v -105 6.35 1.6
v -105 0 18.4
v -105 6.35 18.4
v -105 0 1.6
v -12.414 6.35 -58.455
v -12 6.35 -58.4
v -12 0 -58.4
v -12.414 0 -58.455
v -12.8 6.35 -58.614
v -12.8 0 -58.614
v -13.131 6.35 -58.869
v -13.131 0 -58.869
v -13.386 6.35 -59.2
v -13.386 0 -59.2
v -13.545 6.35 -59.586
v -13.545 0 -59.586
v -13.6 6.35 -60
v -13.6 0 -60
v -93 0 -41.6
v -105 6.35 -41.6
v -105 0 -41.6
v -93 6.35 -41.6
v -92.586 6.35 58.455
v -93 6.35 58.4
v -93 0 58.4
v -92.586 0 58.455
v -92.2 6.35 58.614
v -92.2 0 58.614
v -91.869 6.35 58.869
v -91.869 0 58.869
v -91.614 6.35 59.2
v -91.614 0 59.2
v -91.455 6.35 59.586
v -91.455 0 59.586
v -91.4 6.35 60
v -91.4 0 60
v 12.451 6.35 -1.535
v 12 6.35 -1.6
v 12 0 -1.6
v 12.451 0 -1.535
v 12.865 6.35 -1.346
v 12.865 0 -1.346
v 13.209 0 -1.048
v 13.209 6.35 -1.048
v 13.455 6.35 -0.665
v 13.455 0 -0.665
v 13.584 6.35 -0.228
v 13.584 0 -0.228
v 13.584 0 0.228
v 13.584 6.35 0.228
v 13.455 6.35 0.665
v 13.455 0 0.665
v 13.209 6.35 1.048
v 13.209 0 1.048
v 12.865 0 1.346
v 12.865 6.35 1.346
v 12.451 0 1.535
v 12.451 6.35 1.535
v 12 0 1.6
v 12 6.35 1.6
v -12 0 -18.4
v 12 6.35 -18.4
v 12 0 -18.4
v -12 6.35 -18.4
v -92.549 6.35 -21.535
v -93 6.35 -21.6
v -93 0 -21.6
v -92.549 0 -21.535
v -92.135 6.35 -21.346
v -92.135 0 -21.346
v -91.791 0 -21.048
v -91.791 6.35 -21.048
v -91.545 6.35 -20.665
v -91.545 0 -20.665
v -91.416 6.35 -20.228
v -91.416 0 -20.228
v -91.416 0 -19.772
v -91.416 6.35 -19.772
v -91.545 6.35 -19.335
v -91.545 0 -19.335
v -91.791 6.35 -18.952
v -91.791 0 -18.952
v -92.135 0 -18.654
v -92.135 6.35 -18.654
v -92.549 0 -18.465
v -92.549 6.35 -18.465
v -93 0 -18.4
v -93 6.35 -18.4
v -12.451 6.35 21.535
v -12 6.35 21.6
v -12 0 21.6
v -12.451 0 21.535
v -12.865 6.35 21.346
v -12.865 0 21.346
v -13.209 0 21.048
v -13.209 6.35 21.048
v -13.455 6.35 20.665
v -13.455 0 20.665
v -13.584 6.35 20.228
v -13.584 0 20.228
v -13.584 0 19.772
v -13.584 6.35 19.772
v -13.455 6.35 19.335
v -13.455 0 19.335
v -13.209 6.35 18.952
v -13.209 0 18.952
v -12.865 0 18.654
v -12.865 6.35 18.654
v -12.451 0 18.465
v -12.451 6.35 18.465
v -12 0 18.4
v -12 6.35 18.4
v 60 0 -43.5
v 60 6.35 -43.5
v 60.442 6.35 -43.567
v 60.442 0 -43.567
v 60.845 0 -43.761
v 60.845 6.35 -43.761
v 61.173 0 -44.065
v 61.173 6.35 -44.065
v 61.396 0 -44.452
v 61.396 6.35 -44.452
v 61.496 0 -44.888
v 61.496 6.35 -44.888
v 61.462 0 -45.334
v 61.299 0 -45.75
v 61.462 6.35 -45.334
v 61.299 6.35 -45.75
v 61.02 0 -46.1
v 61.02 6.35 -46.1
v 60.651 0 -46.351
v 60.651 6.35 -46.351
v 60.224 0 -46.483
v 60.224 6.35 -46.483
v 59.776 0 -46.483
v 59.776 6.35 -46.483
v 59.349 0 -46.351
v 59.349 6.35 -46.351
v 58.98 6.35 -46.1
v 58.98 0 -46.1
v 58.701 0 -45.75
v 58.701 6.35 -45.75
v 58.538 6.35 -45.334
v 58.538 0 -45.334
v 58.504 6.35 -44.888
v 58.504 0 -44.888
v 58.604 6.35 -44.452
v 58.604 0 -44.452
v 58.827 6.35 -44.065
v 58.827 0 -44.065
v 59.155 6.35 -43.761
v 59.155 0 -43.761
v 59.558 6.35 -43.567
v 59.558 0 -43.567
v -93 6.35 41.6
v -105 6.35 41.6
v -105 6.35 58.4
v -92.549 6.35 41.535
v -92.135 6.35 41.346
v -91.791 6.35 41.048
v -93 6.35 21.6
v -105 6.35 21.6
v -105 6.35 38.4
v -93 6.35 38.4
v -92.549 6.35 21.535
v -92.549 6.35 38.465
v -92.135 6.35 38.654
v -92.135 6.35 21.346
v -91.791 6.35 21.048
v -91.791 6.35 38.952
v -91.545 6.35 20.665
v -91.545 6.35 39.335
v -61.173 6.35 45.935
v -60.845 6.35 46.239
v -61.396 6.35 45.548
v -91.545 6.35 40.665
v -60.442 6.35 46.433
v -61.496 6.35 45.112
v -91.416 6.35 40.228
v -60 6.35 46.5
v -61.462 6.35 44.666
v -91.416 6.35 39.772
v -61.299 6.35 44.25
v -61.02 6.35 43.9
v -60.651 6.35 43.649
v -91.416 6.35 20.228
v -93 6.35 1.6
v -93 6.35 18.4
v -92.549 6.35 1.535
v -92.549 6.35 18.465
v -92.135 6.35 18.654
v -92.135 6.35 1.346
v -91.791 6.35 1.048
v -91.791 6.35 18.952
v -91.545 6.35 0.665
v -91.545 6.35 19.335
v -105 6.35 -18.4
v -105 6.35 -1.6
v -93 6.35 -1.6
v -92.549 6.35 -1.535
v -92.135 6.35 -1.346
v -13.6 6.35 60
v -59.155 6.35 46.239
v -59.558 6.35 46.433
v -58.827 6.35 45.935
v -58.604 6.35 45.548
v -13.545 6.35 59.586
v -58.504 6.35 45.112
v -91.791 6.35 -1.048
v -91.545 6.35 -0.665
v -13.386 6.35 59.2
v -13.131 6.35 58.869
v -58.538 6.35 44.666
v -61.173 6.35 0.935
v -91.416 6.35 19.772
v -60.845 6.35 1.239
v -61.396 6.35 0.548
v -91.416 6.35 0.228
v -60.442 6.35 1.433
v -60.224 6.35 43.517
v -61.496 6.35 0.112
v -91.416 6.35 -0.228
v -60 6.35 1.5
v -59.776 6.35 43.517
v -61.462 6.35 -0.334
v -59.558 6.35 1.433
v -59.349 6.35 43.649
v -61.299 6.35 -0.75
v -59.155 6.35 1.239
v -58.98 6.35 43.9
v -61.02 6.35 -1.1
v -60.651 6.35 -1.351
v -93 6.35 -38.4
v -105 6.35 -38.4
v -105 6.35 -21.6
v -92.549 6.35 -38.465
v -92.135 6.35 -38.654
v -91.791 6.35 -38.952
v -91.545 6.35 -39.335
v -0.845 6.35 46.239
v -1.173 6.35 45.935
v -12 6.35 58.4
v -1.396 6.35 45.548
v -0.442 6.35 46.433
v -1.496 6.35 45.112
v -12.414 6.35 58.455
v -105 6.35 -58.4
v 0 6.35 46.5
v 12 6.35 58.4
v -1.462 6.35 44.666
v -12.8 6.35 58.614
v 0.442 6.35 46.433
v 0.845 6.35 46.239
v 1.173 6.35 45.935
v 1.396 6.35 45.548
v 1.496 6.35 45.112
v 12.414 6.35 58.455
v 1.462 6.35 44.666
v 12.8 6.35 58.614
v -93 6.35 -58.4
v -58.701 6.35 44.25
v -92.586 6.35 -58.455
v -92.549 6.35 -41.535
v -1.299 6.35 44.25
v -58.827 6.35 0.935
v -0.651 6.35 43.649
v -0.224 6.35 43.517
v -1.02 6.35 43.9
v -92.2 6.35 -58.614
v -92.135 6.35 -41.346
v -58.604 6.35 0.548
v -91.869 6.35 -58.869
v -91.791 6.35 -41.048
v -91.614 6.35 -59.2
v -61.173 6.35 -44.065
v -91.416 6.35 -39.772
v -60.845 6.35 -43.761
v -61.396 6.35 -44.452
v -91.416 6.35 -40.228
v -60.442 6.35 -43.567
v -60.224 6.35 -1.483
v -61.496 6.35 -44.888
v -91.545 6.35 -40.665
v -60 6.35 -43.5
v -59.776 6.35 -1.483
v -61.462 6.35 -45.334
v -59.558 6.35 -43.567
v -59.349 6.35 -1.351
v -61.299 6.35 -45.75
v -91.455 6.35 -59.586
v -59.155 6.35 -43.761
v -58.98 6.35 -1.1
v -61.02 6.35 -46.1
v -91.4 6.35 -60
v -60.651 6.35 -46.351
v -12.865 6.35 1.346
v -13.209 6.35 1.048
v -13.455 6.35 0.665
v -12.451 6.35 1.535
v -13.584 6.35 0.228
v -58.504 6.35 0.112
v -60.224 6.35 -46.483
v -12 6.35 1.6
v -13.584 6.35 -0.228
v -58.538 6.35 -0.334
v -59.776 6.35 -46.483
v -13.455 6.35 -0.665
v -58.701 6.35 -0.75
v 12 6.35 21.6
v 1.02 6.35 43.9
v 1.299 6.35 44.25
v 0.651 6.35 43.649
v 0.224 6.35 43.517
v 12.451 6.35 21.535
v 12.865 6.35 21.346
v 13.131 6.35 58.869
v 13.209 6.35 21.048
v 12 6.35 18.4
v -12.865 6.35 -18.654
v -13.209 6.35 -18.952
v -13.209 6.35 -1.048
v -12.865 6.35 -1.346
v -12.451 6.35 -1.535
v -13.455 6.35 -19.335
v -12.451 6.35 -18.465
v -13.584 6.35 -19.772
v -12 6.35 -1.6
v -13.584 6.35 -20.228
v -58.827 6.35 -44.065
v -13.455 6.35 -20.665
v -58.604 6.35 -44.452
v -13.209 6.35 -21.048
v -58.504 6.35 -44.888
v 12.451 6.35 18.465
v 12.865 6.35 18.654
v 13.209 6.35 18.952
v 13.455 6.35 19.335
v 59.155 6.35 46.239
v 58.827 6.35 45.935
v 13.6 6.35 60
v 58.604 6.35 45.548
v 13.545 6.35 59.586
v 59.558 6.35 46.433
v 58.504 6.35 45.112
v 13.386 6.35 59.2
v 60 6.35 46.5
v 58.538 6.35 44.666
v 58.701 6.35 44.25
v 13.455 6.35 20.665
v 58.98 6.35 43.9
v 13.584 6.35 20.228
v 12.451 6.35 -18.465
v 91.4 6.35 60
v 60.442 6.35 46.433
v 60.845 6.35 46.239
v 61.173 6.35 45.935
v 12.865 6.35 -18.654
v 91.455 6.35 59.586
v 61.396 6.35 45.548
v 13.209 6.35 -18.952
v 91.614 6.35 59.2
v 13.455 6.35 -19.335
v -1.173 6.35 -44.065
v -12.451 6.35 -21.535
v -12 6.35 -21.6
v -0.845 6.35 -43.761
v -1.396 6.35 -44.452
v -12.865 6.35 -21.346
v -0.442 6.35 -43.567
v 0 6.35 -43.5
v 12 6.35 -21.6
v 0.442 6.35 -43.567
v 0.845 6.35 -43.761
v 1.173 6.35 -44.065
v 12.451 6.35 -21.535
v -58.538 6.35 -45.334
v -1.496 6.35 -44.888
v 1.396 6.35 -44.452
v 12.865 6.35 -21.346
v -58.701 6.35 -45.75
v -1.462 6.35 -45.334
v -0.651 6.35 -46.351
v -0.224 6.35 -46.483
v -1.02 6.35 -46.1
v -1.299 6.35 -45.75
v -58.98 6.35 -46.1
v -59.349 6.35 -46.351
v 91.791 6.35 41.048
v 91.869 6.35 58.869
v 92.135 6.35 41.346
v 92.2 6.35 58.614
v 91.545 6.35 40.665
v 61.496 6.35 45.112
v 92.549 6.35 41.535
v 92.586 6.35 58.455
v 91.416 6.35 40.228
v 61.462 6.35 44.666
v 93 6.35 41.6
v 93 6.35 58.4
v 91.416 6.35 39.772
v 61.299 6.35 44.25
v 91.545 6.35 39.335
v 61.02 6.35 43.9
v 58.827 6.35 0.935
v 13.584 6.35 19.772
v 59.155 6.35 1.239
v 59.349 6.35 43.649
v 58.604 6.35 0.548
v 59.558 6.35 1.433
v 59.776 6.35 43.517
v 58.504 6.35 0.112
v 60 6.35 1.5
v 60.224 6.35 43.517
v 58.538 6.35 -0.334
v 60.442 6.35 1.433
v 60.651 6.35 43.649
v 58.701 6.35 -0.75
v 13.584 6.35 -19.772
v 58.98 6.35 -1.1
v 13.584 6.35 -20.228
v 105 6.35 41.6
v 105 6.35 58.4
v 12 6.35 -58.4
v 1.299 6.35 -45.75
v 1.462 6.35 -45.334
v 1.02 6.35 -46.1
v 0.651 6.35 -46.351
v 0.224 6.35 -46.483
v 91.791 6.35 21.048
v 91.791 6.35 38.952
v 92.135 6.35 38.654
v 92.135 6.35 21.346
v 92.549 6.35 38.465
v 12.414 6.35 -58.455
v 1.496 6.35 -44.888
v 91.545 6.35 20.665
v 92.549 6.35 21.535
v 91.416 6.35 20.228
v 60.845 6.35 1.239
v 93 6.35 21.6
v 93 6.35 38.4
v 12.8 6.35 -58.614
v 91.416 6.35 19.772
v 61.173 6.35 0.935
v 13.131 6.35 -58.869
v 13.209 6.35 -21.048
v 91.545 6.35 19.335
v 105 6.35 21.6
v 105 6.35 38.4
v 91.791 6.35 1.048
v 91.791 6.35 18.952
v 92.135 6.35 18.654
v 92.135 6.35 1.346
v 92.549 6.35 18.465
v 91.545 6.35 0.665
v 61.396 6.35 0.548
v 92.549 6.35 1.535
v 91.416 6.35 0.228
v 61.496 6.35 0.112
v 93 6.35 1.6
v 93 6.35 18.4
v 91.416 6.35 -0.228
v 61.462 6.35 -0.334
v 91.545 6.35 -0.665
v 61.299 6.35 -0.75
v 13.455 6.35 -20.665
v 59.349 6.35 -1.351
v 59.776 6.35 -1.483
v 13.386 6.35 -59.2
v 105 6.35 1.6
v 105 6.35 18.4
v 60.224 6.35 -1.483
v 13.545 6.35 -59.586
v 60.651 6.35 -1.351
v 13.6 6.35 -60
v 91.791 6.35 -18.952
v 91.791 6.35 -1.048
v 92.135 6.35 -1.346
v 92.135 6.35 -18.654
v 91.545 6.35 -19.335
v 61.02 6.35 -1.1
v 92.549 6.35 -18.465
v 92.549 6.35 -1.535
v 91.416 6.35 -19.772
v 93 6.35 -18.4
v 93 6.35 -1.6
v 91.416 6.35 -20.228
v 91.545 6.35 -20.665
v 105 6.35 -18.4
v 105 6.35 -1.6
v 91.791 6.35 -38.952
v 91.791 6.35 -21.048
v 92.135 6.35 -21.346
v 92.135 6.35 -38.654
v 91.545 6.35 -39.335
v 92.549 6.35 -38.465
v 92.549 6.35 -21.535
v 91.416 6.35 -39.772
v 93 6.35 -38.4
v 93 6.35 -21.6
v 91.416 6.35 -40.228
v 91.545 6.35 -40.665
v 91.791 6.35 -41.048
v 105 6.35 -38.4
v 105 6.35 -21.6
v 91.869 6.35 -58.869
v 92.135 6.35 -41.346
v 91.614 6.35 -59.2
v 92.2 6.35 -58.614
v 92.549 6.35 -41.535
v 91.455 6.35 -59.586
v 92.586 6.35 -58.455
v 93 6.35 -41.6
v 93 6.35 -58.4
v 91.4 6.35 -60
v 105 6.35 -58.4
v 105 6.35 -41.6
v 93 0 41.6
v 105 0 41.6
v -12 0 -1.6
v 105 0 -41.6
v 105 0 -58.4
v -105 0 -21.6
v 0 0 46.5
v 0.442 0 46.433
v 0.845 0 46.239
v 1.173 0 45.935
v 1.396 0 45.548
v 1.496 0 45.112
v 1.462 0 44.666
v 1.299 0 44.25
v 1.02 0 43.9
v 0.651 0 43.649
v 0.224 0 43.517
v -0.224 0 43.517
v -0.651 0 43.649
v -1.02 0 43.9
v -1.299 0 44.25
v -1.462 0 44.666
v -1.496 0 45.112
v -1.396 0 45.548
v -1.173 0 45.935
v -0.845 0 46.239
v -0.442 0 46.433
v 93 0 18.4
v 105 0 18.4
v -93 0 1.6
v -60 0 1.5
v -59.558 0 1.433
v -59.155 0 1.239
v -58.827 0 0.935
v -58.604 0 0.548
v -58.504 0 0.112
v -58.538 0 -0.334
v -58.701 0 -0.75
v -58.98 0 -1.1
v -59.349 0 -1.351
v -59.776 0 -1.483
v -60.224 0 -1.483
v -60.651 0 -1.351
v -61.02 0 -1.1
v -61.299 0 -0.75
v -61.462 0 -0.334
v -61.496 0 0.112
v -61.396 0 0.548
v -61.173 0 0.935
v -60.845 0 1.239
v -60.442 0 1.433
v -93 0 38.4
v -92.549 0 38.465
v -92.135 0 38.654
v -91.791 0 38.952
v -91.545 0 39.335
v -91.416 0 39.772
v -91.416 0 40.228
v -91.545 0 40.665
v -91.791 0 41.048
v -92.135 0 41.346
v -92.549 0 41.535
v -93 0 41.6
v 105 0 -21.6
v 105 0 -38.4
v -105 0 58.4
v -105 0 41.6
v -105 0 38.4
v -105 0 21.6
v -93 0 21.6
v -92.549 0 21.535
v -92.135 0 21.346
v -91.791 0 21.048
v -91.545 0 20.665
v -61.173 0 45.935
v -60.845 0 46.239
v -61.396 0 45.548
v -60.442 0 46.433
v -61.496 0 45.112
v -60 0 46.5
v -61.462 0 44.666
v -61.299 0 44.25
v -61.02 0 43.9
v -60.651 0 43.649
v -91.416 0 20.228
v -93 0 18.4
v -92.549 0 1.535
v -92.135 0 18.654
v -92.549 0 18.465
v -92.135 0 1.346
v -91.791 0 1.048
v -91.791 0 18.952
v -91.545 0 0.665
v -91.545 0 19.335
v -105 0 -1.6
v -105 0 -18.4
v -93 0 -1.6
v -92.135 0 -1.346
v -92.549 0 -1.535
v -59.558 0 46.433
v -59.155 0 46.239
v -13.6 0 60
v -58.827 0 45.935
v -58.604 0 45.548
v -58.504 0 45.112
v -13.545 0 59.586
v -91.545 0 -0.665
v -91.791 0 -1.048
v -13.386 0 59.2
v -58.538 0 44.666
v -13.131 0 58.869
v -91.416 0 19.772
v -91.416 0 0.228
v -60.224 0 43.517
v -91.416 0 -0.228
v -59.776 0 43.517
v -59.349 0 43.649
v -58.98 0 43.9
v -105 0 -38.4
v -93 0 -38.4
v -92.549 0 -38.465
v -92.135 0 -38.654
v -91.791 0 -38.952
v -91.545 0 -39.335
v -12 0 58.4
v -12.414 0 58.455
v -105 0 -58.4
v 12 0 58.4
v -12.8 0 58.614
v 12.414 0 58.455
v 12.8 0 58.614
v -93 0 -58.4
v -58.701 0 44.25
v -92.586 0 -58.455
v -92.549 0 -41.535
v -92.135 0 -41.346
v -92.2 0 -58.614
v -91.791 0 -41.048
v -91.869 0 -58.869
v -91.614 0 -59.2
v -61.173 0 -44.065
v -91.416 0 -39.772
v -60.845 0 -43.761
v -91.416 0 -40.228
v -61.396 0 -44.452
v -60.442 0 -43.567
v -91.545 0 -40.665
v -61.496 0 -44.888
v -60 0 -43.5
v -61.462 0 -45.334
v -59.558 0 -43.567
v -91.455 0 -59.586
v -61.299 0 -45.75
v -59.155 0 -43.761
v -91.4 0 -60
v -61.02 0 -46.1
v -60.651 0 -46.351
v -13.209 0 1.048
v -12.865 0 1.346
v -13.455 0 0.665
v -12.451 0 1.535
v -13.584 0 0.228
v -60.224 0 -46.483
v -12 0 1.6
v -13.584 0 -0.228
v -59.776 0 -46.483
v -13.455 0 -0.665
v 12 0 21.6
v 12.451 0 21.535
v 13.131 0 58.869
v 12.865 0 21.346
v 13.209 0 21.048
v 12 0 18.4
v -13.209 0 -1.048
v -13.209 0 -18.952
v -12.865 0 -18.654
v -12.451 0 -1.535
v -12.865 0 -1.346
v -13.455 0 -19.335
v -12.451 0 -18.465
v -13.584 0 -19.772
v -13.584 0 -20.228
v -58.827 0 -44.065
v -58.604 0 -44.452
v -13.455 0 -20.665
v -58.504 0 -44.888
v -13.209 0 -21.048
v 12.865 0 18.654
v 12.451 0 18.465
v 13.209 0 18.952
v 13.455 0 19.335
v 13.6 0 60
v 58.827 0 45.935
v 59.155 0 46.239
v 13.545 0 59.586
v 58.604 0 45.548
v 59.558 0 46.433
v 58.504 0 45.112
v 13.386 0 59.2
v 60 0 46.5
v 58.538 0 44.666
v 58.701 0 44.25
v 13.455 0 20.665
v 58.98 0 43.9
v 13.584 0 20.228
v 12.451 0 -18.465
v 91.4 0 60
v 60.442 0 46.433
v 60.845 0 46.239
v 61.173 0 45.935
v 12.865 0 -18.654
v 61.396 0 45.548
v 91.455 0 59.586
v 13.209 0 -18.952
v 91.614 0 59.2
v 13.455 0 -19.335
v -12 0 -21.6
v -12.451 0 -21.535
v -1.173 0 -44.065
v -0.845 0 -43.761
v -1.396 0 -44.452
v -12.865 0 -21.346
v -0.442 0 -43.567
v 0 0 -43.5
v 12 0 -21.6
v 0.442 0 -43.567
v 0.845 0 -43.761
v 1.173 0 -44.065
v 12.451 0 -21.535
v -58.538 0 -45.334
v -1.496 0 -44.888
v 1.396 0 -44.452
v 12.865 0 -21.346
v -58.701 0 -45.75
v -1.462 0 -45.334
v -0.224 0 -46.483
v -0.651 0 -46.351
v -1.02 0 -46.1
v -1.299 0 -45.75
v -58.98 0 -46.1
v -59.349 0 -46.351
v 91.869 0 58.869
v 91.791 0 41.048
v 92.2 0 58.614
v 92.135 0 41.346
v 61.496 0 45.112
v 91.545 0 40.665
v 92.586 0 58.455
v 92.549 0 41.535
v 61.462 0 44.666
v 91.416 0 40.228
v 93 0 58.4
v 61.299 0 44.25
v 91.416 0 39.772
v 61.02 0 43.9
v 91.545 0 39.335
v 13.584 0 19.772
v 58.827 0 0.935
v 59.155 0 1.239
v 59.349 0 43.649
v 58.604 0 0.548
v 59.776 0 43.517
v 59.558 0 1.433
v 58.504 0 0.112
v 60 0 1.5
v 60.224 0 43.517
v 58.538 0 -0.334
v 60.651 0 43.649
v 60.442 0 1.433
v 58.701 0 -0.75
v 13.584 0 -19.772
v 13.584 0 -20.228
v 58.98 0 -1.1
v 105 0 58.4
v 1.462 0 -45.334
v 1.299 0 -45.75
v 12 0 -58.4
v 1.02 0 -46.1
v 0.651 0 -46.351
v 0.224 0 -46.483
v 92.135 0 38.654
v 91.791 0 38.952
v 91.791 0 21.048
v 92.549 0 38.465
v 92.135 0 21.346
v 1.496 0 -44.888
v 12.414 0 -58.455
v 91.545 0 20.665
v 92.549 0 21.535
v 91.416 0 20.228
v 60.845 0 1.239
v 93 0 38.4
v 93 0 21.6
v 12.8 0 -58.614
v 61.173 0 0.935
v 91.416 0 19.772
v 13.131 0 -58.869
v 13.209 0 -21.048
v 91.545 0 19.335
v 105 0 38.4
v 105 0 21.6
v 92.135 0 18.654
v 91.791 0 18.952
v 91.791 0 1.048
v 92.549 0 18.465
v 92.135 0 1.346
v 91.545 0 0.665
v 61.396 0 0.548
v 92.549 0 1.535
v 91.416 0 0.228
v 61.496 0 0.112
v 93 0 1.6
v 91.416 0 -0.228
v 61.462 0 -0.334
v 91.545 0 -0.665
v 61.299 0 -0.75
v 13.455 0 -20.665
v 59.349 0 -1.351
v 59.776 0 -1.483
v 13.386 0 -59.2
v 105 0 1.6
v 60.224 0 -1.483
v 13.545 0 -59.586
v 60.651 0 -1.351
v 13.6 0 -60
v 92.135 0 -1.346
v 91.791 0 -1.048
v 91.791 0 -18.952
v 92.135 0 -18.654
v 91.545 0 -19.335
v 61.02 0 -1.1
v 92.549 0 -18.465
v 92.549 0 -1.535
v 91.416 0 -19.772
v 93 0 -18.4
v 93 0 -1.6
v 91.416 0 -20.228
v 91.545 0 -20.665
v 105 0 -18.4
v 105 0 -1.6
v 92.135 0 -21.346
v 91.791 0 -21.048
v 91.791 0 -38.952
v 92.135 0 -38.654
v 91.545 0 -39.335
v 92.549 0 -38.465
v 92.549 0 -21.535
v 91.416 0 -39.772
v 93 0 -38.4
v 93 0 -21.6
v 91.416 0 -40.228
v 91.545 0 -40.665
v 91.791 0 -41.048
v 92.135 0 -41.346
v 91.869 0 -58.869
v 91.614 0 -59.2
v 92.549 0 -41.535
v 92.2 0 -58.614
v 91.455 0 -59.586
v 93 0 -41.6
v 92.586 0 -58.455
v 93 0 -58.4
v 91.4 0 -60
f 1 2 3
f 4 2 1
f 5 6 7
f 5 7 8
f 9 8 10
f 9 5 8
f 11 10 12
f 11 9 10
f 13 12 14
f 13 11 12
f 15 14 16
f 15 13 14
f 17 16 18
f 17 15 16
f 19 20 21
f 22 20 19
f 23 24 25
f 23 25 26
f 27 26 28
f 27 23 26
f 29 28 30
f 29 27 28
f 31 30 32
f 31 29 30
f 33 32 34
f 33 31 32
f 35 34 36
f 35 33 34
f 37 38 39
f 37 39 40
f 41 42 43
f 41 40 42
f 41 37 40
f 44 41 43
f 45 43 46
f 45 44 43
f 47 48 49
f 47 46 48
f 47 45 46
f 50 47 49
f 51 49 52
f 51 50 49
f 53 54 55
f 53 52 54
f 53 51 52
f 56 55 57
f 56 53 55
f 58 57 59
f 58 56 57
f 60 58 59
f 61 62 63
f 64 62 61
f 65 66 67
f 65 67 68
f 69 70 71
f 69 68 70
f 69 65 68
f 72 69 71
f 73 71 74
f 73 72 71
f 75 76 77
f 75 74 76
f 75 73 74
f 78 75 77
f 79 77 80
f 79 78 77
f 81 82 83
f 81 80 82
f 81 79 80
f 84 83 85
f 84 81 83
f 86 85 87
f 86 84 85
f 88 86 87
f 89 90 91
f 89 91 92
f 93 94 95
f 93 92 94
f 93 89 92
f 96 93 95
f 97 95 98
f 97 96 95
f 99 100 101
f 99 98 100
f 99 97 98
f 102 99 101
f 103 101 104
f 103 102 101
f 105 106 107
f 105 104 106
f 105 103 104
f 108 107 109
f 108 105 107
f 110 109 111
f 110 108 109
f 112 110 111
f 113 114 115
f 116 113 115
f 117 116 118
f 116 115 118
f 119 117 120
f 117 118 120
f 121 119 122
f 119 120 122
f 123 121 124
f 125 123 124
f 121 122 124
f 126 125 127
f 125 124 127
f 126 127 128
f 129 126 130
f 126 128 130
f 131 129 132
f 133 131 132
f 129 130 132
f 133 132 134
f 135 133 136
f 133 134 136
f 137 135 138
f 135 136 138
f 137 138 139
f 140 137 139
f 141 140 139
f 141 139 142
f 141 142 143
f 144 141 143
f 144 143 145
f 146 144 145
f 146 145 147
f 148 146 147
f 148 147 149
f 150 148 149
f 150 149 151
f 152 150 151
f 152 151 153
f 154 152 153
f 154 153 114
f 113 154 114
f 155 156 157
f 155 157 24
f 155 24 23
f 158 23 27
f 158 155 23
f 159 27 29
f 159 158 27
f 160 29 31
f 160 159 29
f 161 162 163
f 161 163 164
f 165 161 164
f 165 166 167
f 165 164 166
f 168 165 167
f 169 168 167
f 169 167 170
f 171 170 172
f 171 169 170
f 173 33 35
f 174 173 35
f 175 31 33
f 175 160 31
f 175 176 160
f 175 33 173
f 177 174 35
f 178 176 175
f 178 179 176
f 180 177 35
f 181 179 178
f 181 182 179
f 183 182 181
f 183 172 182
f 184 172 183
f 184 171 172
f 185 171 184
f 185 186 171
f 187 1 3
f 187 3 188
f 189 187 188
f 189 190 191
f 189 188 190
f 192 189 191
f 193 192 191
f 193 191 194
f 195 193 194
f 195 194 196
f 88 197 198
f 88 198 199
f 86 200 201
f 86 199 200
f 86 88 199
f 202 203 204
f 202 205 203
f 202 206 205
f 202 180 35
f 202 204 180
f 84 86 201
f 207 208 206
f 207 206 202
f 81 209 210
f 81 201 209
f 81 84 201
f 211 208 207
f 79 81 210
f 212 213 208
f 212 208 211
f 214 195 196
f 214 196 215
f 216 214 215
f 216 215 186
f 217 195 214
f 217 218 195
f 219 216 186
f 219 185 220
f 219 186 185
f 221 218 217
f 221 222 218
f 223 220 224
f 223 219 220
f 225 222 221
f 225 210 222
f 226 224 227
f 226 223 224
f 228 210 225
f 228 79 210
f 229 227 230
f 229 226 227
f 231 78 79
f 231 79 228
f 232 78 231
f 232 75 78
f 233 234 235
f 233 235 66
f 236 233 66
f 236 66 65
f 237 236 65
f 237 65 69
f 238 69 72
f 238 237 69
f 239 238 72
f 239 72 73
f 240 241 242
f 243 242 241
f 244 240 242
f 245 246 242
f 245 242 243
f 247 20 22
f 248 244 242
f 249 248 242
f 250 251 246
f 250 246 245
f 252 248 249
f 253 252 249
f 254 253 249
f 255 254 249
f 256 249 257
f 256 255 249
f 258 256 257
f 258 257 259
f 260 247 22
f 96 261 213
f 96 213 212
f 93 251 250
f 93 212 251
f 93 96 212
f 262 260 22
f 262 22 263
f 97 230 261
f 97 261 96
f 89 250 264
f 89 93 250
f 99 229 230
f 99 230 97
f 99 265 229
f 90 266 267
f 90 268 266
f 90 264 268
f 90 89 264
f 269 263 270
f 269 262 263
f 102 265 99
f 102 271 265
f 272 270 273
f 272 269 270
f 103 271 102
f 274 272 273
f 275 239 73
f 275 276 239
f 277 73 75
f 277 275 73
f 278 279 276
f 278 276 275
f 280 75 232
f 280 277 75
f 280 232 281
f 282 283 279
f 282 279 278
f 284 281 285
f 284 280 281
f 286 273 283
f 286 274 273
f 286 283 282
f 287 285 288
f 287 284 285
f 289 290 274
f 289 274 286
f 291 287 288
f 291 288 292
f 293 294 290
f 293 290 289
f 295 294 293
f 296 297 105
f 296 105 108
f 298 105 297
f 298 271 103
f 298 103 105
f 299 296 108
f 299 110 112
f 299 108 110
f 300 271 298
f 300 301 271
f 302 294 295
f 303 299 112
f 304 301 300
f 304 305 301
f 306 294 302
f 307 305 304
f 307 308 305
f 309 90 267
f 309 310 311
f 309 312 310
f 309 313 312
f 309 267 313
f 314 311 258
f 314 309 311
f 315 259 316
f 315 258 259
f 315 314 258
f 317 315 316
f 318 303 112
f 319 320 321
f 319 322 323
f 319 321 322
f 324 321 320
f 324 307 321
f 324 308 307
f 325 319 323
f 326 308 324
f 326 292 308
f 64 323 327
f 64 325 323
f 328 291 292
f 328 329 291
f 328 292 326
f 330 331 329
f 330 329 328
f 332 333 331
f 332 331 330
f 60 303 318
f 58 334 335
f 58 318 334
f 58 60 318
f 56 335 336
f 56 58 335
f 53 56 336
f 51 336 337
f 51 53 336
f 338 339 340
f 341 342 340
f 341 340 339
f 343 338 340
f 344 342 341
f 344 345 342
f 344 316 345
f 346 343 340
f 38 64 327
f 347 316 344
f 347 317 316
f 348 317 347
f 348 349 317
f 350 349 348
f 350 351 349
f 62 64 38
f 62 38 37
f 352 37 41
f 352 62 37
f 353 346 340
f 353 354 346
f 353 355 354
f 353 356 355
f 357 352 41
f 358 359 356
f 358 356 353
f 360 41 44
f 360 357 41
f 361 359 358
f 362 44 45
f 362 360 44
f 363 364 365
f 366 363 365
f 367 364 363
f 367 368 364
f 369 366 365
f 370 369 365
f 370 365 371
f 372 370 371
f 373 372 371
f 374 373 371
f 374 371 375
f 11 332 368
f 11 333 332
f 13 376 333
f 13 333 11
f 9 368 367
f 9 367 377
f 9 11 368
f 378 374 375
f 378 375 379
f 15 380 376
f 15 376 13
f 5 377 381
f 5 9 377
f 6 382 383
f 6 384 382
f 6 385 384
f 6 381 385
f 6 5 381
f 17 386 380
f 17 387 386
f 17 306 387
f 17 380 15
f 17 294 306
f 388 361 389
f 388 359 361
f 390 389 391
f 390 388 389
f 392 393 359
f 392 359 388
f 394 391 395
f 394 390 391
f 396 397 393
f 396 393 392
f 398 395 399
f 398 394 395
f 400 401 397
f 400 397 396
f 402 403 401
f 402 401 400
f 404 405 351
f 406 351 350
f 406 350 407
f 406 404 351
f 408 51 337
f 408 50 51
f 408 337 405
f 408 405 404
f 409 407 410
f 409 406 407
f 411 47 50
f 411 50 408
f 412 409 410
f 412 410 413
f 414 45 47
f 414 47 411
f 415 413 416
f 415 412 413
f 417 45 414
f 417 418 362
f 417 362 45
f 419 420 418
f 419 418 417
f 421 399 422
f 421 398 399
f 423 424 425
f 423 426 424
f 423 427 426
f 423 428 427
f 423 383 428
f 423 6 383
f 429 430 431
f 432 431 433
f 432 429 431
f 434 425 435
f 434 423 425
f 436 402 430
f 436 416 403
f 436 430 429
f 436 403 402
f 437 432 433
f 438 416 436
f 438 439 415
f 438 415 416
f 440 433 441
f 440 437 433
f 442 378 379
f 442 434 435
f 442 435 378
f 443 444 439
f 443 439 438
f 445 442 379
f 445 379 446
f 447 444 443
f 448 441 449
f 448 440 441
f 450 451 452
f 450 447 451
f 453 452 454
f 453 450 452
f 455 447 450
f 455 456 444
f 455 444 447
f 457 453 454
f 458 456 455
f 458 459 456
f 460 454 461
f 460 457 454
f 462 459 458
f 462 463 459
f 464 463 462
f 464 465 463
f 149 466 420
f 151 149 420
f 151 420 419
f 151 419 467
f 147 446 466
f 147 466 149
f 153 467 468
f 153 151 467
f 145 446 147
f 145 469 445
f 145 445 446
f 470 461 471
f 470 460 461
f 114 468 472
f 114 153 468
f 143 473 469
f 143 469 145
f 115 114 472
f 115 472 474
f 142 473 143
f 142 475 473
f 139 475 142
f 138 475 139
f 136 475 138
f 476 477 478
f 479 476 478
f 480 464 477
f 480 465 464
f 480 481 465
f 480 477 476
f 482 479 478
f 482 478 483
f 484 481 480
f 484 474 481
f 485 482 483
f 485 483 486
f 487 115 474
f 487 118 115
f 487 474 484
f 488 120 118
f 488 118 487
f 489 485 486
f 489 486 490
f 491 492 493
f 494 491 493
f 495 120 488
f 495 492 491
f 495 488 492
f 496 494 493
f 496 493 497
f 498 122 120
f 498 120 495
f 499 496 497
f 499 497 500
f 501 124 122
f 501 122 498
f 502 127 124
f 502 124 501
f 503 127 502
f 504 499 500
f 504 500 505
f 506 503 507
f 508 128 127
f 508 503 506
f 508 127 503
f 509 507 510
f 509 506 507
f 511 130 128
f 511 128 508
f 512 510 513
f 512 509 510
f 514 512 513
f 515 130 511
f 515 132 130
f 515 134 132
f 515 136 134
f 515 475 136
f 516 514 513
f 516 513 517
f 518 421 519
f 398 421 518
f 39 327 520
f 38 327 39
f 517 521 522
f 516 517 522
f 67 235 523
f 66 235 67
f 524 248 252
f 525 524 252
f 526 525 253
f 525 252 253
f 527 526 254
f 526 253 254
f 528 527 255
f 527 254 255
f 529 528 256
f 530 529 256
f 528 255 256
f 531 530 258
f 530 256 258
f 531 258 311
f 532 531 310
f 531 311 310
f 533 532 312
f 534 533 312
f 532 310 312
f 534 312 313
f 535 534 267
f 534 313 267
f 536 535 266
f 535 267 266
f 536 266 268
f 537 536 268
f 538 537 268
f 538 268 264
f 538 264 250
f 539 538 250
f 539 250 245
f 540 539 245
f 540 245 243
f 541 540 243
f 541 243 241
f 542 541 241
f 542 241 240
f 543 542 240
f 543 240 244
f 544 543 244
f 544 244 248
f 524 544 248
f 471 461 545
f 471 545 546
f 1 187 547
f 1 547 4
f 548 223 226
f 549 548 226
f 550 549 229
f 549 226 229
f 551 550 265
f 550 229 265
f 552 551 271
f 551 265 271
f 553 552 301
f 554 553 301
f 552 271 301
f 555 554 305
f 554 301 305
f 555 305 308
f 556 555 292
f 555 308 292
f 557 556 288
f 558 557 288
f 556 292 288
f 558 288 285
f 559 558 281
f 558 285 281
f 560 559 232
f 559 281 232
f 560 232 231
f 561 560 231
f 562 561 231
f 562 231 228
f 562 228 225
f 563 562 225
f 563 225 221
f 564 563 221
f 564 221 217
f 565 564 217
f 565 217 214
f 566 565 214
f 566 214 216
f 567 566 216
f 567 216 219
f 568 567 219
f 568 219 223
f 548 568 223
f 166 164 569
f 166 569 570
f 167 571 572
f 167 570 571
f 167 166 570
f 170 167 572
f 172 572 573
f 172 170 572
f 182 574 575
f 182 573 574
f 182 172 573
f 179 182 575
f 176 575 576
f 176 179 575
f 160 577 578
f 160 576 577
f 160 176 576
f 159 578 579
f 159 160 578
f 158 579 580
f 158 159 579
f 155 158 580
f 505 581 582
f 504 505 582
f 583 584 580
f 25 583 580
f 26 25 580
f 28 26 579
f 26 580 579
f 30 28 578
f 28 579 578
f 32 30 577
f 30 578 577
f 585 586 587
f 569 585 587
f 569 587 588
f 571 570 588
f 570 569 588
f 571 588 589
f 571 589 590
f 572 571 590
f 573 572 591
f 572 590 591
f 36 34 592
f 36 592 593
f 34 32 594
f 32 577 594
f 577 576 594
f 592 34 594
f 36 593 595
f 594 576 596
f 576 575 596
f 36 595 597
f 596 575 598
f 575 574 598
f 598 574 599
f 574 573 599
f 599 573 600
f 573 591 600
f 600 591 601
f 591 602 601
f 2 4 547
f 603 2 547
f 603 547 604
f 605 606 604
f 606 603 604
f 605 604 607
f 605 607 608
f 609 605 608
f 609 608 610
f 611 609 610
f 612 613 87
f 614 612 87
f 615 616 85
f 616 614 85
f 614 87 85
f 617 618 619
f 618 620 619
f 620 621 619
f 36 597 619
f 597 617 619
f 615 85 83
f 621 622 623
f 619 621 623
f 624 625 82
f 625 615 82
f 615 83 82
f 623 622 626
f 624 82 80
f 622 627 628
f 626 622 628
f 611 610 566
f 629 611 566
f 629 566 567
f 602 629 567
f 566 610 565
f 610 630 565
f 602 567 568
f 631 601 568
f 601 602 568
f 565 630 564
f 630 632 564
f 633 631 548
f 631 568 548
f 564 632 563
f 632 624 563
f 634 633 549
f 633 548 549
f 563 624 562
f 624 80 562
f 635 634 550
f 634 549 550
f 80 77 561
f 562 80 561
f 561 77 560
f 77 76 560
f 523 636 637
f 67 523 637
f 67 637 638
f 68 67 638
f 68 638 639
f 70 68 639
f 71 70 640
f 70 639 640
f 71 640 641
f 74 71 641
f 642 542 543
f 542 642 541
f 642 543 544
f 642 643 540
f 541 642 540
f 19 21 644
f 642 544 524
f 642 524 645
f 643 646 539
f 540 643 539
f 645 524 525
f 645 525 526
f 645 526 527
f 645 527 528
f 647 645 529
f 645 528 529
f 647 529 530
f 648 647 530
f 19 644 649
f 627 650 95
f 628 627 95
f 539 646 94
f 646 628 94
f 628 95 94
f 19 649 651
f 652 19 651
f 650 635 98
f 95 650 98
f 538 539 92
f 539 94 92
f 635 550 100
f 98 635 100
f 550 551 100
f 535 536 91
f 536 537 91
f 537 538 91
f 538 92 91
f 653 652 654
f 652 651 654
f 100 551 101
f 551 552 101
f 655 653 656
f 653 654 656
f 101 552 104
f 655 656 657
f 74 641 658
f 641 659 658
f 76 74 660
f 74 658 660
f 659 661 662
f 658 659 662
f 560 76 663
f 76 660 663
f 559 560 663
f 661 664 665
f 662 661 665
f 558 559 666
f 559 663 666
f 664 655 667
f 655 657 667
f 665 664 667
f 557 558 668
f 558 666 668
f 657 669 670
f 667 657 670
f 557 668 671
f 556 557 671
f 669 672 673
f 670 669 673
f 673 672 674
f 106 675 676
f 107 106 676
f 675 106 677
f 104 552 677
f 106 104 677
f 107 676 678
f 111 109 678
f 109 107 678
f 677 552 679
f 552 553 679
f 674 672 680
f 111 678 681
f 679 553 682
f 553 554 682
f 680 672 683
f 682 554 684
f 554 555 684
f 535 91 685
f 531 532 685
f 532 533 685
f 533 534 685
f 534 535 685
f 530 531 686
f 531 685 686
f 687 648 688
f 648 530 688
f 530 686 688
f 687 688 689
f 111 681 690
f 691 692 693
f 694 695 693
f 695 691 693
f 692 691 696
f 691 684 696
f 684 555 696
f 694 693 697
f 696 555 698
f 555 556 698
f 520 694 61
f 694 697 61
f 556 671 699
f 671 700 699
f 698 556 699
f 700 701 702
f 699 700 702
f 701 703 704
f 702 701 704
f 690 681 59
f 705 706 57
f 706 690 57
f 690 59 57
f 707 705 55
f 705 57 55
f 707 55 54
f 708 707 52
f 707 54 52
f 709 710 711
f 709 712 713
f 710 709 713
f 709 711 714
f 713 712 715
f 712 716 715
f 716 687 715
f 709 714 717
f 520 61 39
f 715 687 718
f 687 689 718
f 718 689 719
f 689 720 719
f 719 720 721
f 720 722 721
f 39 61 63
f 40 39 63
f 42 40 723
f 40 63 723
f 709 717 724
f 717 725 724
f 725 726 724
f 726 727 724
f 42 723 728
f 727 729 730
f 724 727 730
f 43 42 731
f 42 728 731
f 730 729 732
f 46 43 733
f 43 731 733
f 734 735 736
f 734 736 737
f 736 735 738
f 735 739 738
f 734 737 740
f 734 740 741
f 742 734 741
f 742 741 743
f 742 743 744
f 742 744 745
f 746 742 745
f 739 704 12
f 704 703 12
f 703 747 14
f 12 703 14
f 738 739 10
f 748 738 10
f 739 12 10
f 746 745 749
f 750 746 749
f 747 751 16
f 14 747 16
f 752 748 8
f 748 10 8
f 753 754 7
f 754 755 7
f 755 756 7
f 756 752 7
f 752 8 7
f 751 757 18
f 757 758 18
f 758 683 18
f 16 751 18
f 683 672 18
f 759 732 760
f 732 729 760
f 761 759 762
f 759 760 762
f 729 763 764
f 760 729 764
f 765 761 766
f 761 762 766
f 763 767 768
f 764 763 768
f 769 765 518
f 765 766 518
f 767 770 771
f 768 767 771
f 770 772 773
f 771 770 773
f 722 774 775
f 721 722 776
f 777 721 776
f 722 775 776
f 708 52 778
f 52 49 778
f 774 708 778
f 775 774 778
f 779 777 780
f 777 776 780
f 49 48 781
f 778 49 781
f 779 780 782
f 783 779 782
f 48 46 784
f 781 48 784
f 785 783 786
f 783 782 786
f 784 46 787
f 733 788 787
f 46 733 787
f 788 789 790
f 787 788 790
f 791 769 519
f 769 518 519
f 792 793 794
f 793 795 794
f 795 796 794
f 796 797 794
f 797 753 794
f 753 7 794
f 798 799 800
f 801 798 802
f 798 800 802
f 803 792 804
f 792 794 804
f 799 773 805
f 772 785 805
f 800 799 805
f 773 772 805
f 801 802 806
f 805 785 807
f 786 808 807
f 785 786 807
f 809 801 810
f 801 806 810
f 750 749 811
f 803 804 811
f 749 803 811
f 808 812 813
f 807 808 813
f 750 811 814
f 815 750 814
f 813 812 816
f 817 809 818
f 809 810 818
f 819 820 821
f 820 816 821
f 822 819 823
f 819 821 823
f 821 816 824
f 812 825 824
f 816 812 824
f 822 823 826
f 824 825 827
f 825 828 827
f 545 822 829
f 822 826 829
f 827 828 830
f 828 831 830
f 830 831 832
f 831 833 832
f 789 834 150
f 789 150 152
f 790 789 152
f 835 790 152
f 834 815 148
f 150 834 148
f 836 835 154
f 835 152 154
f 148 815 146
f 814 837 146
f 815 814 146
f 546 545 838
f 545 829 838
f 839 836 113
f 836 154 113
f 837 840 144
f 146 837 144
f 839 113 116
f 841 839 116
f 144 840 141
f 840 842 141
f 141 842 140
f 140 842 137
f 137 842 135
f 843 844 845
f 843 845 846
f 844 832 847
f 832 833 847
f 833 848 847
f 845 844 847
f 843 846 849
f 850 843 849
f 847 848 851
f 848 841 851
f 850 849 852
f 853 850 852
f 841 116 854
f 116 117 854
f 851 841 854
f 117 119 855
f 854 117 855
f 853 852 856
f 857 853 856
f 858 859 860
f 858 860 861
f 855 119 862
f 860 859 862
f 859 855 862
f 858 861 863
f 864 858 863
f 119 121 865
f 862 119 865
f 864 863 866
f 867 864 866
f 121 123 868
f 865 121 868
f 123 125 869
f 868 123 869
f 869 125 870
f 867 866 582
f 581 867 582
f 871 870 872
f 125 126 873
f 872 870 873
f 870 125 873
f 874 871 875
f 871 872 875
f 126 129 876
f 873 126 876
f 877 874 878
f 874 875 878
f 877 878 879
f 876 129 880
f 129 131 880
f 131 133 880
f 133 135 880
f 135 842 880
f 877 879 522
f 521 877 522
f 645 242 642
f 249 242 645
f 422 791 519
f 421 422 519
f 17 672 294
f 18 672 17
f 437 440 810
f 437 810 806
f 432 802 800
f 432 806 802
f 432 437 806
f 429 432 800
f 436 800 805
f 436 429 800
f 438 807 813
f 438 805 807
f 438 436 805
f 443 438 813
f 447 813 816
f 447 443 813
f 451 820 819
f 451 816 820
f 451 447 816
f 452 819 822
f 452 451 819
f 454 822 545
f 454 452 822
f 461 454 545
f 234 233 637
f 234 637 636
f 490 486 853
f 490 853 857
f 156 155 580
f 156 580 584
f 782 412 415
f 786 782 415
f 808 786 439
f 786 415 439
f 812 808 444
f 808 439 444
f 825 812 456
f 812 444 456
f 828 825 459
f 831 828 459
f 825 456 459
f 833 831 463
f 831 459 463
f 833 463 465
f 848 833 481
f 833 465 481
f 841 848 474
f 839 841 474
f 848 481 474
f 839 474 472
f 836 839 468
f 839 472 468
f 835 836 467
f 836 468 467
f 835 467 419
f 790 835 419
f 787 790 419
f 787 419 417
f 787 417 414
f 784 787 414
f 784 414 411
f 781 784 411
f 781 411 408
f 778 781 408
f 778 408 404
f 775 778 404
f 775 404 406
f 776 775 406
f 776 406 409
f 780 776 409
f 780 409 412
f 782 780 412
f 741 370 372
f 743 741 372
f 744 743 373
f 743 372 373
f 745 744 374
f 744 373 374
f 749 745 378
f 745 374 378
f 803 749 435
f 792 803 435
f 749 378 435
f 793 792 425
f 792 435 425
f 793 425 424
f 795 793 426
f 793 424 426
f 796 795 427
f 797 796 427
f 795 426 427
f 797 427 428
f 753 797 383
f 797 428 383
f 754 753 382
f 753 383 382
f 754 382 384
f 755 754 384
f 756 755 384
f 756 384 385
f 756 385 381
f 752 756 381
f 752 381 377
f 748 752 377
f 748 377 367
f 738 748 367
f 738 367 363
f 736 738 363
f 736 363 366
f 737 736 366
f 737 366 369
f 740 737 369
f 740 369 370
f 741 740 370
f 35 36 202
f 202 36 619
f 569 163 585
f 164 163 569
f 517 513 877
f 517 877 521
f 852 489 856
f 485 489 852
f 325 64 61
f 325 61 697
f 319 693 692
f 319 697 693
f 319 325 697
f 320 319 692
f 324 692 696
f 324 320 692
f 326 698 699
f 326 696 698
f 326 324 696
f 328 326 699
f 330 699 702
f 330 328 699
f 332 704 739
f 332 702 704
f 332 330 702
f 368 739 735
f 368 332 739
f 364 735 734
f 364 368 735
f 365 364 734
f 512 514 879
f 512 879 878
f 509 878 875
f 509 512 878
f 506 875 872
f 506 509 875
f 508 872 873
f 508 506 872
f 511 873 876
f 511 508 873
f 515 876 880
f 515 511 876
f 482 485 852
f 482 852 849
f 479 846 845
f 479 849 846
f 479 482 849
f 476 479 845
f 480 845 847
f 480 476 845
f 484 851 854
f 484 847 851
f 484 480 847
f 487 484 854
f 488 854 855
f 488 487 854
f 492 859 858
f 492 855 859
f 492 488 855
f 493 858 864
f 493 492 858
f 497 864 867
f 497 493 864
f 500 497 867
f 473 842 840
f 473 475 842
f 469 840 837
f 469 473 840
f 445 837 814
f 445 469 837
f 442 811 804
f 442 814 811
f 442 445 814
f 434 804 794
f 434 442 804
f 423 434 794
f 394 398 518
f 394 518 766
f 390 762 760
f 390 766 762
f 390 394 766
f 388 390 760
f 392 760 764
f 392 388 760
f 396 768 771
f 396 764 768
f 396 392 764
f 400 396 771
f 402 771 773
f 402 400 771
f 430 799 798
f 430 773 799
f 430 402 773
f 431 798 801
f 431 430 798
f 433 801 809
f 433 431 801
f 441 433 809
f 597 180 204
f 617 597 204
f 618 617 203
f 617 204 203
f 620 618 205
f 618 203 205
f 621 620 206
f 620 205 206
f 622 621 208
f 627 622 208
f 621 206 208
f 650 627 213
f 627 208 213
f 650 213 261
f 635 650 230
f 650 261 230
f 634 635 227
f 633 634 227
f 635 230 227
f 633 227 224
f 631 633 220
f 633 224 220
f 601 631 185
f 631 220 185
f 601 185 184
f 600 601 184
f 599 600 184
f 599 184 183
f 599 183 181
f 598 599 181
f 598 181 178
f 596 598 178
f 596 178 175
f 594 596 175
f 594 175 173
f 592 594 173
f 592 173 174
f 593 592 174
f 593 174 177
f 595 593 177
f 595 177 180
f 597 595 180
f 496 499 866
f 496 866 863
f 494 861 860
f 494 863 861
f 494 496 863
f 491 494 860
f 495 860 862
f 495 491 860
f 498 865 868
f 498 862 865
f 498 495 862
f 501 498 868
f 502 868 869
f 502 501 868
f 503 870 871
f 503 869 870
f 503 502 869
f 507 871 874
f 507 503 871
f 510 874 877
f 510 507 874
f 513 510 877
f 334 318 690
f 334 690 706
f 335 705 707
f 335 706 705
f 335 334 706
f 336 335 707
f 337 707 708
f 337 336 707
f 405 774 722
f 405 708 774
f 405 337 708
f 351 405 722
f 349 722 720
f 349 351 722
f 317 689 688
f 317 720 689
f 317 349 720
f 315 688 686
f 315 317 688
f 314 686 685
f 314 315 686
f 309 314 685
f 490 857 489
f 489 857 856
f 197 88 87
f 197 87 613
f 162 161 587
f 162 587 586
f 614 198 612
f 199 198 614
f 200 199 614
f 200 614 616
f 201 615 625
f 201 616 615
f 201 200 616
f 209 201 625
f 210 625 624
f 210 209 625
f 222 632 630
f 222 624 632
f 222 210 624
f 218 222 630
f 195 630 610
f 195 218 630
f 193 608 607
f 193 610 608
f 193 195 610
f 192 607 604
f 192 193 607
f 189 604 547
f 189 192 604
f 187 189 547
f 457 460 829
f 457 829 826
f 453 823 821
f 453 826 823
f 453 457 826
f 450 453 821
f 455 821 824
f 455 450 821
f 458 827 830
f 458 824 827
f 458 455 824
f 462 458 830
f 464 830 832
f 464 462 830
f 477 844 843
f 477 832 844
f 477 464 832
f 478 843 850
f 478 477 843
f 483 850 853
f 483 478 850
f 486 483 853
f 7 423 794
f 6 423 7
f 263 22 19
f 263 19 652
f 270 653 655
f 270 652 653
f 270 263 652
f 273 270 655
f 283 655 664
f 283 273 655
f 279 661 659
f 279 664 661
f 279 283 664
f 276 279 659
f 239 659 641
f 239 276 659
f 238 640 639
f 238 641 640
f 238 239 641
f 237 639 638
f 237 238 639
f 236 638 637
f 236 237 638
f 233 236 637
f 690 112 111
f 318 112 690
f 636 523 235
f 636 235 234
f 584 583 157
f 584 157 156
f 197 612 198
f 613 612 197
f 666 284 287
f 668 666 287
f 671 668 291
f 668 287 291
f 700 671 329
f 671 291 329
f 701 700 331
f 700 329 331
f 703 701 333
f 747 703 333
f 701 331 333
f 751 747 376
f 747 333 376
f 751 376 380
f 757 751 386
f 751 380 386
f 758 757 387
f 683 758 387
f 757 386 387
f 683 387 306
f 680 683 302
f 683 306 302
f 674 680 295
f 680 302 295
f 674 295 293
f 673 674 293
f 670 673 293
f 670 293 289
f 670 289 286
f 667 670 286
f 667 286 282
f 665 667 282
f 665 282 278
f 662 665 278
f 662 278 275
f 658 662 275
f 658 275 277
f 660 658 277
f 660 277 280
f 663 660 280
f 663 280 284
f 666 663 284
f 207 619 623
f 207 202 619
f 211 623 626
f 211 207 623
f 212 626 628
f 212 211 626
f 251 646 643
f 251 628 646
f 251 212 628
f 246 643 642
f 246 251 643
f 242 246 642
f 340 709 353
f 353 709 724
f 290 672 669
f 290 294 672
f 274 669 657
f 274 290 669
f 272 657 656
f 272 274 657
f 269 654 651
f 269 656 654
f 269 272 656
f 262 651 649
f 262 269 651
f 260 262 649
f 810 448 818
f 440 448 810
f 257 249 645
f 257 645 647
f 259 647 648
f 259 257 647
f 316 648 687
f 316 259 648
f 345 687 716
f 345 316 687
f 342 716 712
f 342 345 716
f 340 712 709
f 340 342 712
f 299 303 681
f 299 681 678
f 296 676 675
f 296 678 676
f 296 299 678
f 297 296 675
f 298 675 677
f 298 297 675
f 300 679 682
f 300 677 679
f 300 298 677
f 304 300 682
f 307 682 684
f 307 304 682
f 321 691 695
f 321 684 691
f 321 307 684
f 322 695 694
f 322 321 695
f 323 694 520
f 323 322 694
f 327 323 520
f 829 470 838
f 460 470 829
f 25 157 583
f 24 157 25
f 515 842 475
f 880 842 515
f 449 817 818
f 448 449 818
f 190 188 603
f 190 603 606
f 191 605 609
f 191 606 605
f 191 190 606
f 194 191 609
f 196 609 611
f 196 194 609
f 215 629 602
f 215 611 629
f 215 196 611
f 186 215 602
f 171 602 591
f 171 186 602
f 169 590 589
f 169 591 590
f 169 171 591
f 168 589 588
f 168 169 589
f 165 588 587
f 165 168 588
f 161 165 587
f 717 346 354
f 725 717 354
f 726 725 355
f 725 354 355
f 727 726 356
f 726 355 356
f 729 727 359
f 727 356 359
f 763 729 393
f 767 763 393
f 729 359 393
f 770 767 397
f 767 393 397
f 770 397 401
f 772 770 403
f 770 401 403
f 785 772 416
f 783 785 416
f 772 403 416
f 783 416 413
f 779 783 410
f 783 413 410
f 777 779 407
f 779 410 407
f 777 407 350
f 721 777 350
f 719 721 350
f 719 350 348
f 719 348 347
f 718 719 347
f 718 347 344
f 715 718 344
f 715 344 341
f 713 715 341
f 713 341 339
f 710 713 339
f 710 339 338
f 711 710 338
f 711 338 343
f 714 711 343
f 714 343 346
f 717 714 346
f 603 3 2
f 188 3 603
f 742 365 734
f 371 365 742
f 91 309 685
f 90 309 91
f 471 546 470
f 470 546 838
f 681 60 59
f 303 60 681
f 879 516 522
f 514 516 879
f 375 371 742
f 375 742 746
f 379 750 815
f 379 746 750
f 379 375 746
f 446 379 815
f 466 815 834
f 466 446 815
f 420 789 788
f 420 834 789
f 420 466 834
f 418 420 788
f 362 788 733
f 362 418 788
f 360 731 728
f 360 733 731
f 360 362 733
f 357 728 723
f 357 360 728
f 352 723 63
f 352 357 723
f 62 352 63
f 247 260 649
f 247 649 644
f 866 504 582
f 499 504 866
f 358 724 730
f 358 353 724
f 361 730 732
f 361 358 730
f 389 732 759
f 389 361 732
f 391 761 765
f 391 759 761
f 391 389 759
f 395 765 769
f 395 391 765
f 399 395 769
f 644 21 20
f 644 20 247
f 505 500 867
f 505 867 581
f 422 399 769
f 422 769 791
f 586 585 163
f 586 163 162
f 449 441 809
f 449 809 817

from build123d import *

# Parameters (mm, degrees)
SKETCH1_W                  = 210
SKETCH1_H                  = 120
BOSS_EXTRUDE1_DEPTH        = 6.35
CUT_EXTRUDE1_DEPTH         = 122.100464491
LPATTERN1_COUNT            = 4
LPATTERN1_PITCH            = 20
LPATTERN1_COL_COUNT        = 4
LPATTERN1_COL_PITCH        = 20
LPATTERN2_COUNT            = 2
LPATTERN2_PITCH            = 105
LPATTERN2_COPY_1_DEPTH     = 122.100464491
LPATTERN2_COPY_2_DEPTH     = 122.100464491
LPATTERN2_COPY_3_DEPTH     = 122.100464491
LPATTERN2_COPY_4_DEPTH     = 122.100464491
LPATTERN2_COPY_5_DEPTH     = 122.100464491
LPATTERN2_COPY_6_DEPTH     = 122.100464491
LPATTERN2_COL_COUNT        = 2
LPATTERN2_COL_PITCH        = 105
LPATTERN2_COL_COPY_1_DEPTH = 122.100464491
LPATTERN2_COL_COPY_2_DEPTH = 122.100464491
LPATTERN2_COL_COPY_3_DEPTH = 122.100464491
LPATTERN2_COL_COPY_4_DEPTH = 122.100464491
LPATTERN2_COL_COPY_5_DEPTH = 122.100464491
LPATTERN2_COL_COPY_6_DEPTH = 122.100464491
SKETCH6_R                  = 1.5
CUT_EXTRUDE3_DEPTH         = 10
SKETCH7_R                  = 1.5
CUT_EXTRUDE4_DEPTH         = 10
BOSS_EXTRUDE2_DEPTH        = 6.35


with BuildPart() as part:
    # Sketch1 → Boss-Extrude1 (new body)
    with BuildSketch(Plane(origin=(0, 0, 0), x_dir=(1, 0, 0), z_dir=(0, 1, 0))):
        Rectangle(SKETCH1_W, SKETCH1_H)
    extrude(amount=BOSS_EXTRUDE1_DEPTH)

    # Sketch3 → Cut-Extrude1 (cut, symmetric)
    with BuildSketch(Plane(origin=(0, 6.35, 0), x_dir=(1, 0, 0), z_dir=(0, 1, 0))):
        with BuildLine():
            Line((12, -1.6), (-12, -1.6))
            ThreePointArc((-12, -1.6), (-13.6, 0), (-12, 1.6))
            Line((-12, 1.6), (12, 1.6))
            ThreePointArc((12, 1.6), (13.6, 0), (12, -1.6))
        make_face()
    cut_extrude1 = extrude(amount=CUT_EXTRUDE1_DEPTH, both=True, mode=Mode.SUBTRACT)

    # LPattern1: Cut-Extrude1 ×4
    with Locations(*[(0, 0, i * LPATTERN1_PITCH) for i in range(1, LPATTERN1_COUNT)]):
        add(cut_extrude1, mode=Mode.SUBTRACT)

    # LPattern1 col: Cut-Extrude1 ×4
    with Locations(*[(0, 0, -i * LPATTERN1_COL_PITCH) for i in range(1, LPATTERN1_COL_COUNT)]):
        add(cut_extrude1, mode=Mode.SUBTRACT)

    # LPattern2: Cut-Extrude1 ×2
    with Locations(*[(i * LPATTERN2_PITCH, 0, 0) for i in range(1, LPATTERN2_COUNT)]):
        add(cut_extrude1, mode=Mode.SUBTRACT)

    # LPattern2 copy 1 sketch → LPattern2 copy 1 (cut, symmetric)
    with BuildSketch(Plane(origin=(105, 6.35, 20), x_dir=(1, 0, 0), z_dir=(0, 1, 0))):
        with BuildLine():
            Line((12, -1.6), (-12, -1.6))
            ThreePointArc((-12, -1.6), (-13.6, 0), (-12, 1.6))
            Line((-12, 1.6), (12, 1.6))
            ThreePointArc((12, 1.6), (13.6, 0), (12, -1.6))
        make_face()
    extrude(amount=LPATTERN2_COPY_1_DEPTH, both=True, mode=Mode.SUBTRACT)

    # LPattern2 copy 2 sketch → LPattern2 copy 2 (cut, symmetric)
    with BuildSketch(Plane(origin=(105, 6.35, 40), x_dir=(1, 0, 0), z_dir=(0, 1, 0))):
        with BuildLine():
            Line((12, -1.6), (-12, -1.6))
            ThreePointArc((-12, -1.6), (-13.6, 0), (-12, 1.6))
            Line((-12, 1.6), (12, 1.6))
            ThreePointArc((12, 1.6), (13.6, 0), (12, -1.6))
        make_face()
    extrude(amount=LPATTERN2_COPY_2_DEPTH, both=True, mode=Mode.SUBTRACT)

    # LPattern2 copy 3 sketch → LPattern2 copy 3 (cut, symmetric)
    with BuildSketch(Plane(origin=(105, 6.35, 60), x_dir=(1, 0, 0), z_dir=(0, 1, 0))):
        with BuildLine():
            Line((12, -1.6), (-12, -1.6))
            ThreePointArc((-12, -1.6), (-13.6, 0), (-12, 1.6))
            Line((-12, 1.6), (12, 1.6))
            ThreePointArc((12, 1.6), (13.6, 0), (12, -1.6))
        make_face()
    extrude(amount=LPATTERN2_COPY_3_DEPTH, both=True, mode=Mode.SUBTRACT)

    # LPattern2 copy 4 sketch → LPattern2 copy 4 (cut, symmetric)
    with BuildSketch(Plane(origin=(105, 6.35, -20), x_dir=(1, 0, 0), z_dir=(0, 1, 0))):
        with BuildLine():
            Line((12, -1.6), (-12, -1.6))
            ThreePointArc((-12, -1.6), (-13.6, 0), (-12, 1.6))
            Line((-12, 1.6), (12, 1.6))
            ThreePointArc((12, 1.6), (13.6, 0), (12, -1.6))
        make_face()
    extrude(amount=LPATTERN2_COPY_4_DEPTH, both=True, mode=Mode.SUBTRACT)

    # LPattern2 copy 5 sketch → LPattern2 copy 5 (cut, symmetric)
    with BuildSketch(Plane(origin=(105, 6.35, -40), x_dir=(1, 0, 0), z_dir=(0, 1, 0))):
        with BuildLine():
            Line((12, -1.6), (-12, -1.6))
            ThreePointArc((-12, -1.6), (-13.6, 0), (-12, 1.6))
            Line((-12, 1.6), (12, 1.6))
            ThreePointArc((12, 1.6), (13.6, 0), (12, -1.6))
        make_face()
    extrude(amount=LPATTERN2_COPY_5_DEPTH, both=True, mode=Mode.SUBTRACT)

    # LPattern2 copy 6 sketch → LPattern2 copy 6 (cut, symmetric)
    with BuildSketch(Plane(origin=(105, 6.35, -60), x_dir=(1, 0, 0), z_dir=(0, 1, 0))):
        with BuildLine():
            Line((12, -1.6), (-12, -1.6))
            ThreePointArc((-12, -1.6), (-13.6, 0), (-12, 1.6))
            Line((-12, 1.6), (12, 1.6))
            ThreePointArc((12, 1.6), (13.6, 0), (12, -1.6))
        make_face()
    extrude(amount=LPATTERN2_COPY_6_DEPTH, both=True, mode=Mode.SUBTRACT)

    # LPattern2 col: Cut-Extrude1 ×2
    with Locations(*[(-i * LPATTERN2_COL_PITCH, 0, 0) for i in range(1, LPATTERN2_COL_COUNT)]):
        add(cut_extrude1, mode=Mode.SUBTRACT)

    # LPattern2 col copy 1 sketch → LPattern2 col copy 1 (cut, symmetric)
    with BuildSketch(Plane(origin=(-105, 6.35, 20), x_dir=(1, 0, 0), z_dir=(0, 1, 0))):
        with BuildLine():
            Line((12, -1.6), (-12, -1.6))
            ThreePointArc((-12, -1.6), (-13.6, 0), (-12, 1.6))
            Line((-12, 1.6), (12, 1.6))
            ThreePointArc((12, 1.6), (13.6, 0), (12, -1.6))
        make_face()
    extrude(amount=LPATTERN2_COL_COPY_1_DEPTH, both=True, mode=Mode.SUBTRACT)

    # LPattern2 col copy 2 sketch → LPattern2 col copy 2 (cut, symmetric)
    with BuildSketch(Plane(origin=(-105, 6.35, 40), x_dir=(1, 0, 0), z_dir=(0, 1, 0))):
        with BuildLine():
            Line((12, -1.6), (-12, -1.6))
            ThreePointArc((-12, -1.6), (-13.6, 0), (-12, 1.6))
            Line((-12, 1.6), (12, 1.6))
            ThreePointArc((12, 1.6), (13.6, 0), (12, -1.6))
        make_face()
    extrude(amount=LPATTERN2_COL_COPY_2_DEPTH, both=True, mode=Mode.SUBTRACT)

    # LPattern2 col copy 3 sketch → LPattern2 col copy 3 (cut, symmetric)
    with BuildSketch(Plane(origin=(-105, 6.35, 60), x_dir=(1, 0, 0), z_dir=(0, 1, 0))):
        with BuildLine():
            Line((12, -1.6), (-12, -1.6))
            ThreePointArc((-12, -1.6), (-13.6, 0), (-12, 1.6))
            Line((-12, 1.6), (12, 1.6))
            ThreePointArc((12, 1.6), (13.6, 0), (12, -1.6))
        make_face()
    extrude(amount=LPATTERN2_COL_COPY_3_DEPTH, both=True, mode=Mode.SUBTRACT)

    # LPattern2 col copy 4 sketch → LPattern2 col copy 4 (cut, symmetric)
    with BuildSketch(Plane(origin=(-105, 6.35, -20), x_dir=(1, 0, 0), z_dir=(0, 1, 0))):
        with BuildLine():
            Line((12, -1.6), (-12, -1.6))
            ThreePointArc((-12, -1.6), (-13.6, 0), (-12, 1.6))
            Line((-12, 1.6), (12, 1.6))
            ThreePointArc((12, 1.6), (13.6, 0), (12, -1.6))
        make_face()
    extrude(amount=LPATTERN2_COL_COPY_4_DEPTH, both=True, mode=Mode.SUBTRACT)

    # LPattern2 col copy 5 sketch → LPattern2 col copy 5 (cut, symmetric)
    with BuildSketch(Plane(origin=(-105, 6.35, -40), x_dir=(1, 0, 0), z_dir=(0, 1, 0))):
        with BuildLine():
            Line((12, -1.6), (-12, -1.6))
            ThreePointArc((-12, -1.6), (-13.6, 0), (-12, 1.6))
            Line((-12, 1.6), (12, 1.6))
            ThreePointArc((12, 1.6), (13.6, 0), (12, -1.6))
        make_face()
    extrude(amount=LPATTERN2_COL_COPY_5_DEPTH, both=True, mode=Mode.SUBTRACT)

    # LPattern2 col copy 6 sketch → LPattern2 col copy 6 (cut, symmetric)
    with BuildSketch(Plane(origin=(-105, 6.35, -60), x_dir=(1, 0, 0), z_dir=(0, 1, 0))):
        with BuildLine():
            Line((12, -1.6), (-12, -1.6))
            ThreePointArc((-12, -1.6), (-13.6, 0), (-12, 1.6))
            Line((-12, 1.6), (12, 1.6))
            ThreePointArc((12, 1.6), (13.6, 0), (12, -1.6))
        make_face()
    extrude(amount=LPATTERN2_COL_COPY_6_DEPTH, both=True, mode=Mode.SUBTRACT)

    # Sketch6 → Cut-Extrude3 (cut)
    with BuildSketch(Plane(origin=(0, 6.35, 0), x_dir=(1, 0, 0), z_dir=(0, 1, 0))):
        with Locations(Location((-60, 45, 0), (0, 0, 270))):
            Circle(SKETCH6_R)
        with Locations(Location((60, 45, 0), (0, 0, 270))):
            Circle(SKETCH6_R)
        with Locations(Location((60, -45, 0), (0, 0, 270))):
            Circle(SKETCH6_R)
        with Locations(Location((-60, -45, 0), (0, 0, 270))):
            Circle(SKETCH6_R)
        with Locations(Location((0, 45, 0), (0, 0, 270))):
            Circle(SKETCH6_R)
        with Locations(Location((0, -45, 0), (0, 0, 270))):
            Circle(SKETCH6_R)
    extrude(amount=-CUT_EXTRUDE3_DEPTH, mode=Mode.SUBTRACT)

    # Sketch7 → Cut-Extrude4 (cut)
    with BuildSketch(Plane(origin=(0, 6.35, 0), x_dir=(1, 0, 0), z_dir=(0, 1, 0))):
        with Locations(Location((-60, 0, 0), (0, 0, 270))):
            Circle(SKETCH7_R)
        with Locations(Location((60, 0, 0), (0, 0, 270))):
            Circle(SKETCH7_R)
    extrude(amount=-CUT_EXTRUDE4_DEPTH, mode=Mode.SUBTRACT)

    # Sketch8 → Boss-Extrude2 (add)
    with BuildSketch(Plane(origin=(0, 6.35, 0), x_dir=(1, 0, 0), z_dir=(0, 1, 0))):
        with BuildLine():
            Line((-12, 42), (12, 42))
            ThreePointArc((12, 42), (14, 40), (12, 38))
            Line((12, 38), (-12, 38))
            ThreePointArc((-12, 38), (-14, 40), (-12, 42))
        make_face()
        with BuildLine():
            Line((-12, -38), (12, -38))
            ThreePointArc((12, -38), (14, -40), (12, -42))
            Line((12, -42), (-12, -42))
            ThreePointArc((-12, -42), (-14, -40), (-12, -38))
        make_face()
    extrude(amount=-BOSS_EXTRUDE2_DEPTH)


solid = part.part
